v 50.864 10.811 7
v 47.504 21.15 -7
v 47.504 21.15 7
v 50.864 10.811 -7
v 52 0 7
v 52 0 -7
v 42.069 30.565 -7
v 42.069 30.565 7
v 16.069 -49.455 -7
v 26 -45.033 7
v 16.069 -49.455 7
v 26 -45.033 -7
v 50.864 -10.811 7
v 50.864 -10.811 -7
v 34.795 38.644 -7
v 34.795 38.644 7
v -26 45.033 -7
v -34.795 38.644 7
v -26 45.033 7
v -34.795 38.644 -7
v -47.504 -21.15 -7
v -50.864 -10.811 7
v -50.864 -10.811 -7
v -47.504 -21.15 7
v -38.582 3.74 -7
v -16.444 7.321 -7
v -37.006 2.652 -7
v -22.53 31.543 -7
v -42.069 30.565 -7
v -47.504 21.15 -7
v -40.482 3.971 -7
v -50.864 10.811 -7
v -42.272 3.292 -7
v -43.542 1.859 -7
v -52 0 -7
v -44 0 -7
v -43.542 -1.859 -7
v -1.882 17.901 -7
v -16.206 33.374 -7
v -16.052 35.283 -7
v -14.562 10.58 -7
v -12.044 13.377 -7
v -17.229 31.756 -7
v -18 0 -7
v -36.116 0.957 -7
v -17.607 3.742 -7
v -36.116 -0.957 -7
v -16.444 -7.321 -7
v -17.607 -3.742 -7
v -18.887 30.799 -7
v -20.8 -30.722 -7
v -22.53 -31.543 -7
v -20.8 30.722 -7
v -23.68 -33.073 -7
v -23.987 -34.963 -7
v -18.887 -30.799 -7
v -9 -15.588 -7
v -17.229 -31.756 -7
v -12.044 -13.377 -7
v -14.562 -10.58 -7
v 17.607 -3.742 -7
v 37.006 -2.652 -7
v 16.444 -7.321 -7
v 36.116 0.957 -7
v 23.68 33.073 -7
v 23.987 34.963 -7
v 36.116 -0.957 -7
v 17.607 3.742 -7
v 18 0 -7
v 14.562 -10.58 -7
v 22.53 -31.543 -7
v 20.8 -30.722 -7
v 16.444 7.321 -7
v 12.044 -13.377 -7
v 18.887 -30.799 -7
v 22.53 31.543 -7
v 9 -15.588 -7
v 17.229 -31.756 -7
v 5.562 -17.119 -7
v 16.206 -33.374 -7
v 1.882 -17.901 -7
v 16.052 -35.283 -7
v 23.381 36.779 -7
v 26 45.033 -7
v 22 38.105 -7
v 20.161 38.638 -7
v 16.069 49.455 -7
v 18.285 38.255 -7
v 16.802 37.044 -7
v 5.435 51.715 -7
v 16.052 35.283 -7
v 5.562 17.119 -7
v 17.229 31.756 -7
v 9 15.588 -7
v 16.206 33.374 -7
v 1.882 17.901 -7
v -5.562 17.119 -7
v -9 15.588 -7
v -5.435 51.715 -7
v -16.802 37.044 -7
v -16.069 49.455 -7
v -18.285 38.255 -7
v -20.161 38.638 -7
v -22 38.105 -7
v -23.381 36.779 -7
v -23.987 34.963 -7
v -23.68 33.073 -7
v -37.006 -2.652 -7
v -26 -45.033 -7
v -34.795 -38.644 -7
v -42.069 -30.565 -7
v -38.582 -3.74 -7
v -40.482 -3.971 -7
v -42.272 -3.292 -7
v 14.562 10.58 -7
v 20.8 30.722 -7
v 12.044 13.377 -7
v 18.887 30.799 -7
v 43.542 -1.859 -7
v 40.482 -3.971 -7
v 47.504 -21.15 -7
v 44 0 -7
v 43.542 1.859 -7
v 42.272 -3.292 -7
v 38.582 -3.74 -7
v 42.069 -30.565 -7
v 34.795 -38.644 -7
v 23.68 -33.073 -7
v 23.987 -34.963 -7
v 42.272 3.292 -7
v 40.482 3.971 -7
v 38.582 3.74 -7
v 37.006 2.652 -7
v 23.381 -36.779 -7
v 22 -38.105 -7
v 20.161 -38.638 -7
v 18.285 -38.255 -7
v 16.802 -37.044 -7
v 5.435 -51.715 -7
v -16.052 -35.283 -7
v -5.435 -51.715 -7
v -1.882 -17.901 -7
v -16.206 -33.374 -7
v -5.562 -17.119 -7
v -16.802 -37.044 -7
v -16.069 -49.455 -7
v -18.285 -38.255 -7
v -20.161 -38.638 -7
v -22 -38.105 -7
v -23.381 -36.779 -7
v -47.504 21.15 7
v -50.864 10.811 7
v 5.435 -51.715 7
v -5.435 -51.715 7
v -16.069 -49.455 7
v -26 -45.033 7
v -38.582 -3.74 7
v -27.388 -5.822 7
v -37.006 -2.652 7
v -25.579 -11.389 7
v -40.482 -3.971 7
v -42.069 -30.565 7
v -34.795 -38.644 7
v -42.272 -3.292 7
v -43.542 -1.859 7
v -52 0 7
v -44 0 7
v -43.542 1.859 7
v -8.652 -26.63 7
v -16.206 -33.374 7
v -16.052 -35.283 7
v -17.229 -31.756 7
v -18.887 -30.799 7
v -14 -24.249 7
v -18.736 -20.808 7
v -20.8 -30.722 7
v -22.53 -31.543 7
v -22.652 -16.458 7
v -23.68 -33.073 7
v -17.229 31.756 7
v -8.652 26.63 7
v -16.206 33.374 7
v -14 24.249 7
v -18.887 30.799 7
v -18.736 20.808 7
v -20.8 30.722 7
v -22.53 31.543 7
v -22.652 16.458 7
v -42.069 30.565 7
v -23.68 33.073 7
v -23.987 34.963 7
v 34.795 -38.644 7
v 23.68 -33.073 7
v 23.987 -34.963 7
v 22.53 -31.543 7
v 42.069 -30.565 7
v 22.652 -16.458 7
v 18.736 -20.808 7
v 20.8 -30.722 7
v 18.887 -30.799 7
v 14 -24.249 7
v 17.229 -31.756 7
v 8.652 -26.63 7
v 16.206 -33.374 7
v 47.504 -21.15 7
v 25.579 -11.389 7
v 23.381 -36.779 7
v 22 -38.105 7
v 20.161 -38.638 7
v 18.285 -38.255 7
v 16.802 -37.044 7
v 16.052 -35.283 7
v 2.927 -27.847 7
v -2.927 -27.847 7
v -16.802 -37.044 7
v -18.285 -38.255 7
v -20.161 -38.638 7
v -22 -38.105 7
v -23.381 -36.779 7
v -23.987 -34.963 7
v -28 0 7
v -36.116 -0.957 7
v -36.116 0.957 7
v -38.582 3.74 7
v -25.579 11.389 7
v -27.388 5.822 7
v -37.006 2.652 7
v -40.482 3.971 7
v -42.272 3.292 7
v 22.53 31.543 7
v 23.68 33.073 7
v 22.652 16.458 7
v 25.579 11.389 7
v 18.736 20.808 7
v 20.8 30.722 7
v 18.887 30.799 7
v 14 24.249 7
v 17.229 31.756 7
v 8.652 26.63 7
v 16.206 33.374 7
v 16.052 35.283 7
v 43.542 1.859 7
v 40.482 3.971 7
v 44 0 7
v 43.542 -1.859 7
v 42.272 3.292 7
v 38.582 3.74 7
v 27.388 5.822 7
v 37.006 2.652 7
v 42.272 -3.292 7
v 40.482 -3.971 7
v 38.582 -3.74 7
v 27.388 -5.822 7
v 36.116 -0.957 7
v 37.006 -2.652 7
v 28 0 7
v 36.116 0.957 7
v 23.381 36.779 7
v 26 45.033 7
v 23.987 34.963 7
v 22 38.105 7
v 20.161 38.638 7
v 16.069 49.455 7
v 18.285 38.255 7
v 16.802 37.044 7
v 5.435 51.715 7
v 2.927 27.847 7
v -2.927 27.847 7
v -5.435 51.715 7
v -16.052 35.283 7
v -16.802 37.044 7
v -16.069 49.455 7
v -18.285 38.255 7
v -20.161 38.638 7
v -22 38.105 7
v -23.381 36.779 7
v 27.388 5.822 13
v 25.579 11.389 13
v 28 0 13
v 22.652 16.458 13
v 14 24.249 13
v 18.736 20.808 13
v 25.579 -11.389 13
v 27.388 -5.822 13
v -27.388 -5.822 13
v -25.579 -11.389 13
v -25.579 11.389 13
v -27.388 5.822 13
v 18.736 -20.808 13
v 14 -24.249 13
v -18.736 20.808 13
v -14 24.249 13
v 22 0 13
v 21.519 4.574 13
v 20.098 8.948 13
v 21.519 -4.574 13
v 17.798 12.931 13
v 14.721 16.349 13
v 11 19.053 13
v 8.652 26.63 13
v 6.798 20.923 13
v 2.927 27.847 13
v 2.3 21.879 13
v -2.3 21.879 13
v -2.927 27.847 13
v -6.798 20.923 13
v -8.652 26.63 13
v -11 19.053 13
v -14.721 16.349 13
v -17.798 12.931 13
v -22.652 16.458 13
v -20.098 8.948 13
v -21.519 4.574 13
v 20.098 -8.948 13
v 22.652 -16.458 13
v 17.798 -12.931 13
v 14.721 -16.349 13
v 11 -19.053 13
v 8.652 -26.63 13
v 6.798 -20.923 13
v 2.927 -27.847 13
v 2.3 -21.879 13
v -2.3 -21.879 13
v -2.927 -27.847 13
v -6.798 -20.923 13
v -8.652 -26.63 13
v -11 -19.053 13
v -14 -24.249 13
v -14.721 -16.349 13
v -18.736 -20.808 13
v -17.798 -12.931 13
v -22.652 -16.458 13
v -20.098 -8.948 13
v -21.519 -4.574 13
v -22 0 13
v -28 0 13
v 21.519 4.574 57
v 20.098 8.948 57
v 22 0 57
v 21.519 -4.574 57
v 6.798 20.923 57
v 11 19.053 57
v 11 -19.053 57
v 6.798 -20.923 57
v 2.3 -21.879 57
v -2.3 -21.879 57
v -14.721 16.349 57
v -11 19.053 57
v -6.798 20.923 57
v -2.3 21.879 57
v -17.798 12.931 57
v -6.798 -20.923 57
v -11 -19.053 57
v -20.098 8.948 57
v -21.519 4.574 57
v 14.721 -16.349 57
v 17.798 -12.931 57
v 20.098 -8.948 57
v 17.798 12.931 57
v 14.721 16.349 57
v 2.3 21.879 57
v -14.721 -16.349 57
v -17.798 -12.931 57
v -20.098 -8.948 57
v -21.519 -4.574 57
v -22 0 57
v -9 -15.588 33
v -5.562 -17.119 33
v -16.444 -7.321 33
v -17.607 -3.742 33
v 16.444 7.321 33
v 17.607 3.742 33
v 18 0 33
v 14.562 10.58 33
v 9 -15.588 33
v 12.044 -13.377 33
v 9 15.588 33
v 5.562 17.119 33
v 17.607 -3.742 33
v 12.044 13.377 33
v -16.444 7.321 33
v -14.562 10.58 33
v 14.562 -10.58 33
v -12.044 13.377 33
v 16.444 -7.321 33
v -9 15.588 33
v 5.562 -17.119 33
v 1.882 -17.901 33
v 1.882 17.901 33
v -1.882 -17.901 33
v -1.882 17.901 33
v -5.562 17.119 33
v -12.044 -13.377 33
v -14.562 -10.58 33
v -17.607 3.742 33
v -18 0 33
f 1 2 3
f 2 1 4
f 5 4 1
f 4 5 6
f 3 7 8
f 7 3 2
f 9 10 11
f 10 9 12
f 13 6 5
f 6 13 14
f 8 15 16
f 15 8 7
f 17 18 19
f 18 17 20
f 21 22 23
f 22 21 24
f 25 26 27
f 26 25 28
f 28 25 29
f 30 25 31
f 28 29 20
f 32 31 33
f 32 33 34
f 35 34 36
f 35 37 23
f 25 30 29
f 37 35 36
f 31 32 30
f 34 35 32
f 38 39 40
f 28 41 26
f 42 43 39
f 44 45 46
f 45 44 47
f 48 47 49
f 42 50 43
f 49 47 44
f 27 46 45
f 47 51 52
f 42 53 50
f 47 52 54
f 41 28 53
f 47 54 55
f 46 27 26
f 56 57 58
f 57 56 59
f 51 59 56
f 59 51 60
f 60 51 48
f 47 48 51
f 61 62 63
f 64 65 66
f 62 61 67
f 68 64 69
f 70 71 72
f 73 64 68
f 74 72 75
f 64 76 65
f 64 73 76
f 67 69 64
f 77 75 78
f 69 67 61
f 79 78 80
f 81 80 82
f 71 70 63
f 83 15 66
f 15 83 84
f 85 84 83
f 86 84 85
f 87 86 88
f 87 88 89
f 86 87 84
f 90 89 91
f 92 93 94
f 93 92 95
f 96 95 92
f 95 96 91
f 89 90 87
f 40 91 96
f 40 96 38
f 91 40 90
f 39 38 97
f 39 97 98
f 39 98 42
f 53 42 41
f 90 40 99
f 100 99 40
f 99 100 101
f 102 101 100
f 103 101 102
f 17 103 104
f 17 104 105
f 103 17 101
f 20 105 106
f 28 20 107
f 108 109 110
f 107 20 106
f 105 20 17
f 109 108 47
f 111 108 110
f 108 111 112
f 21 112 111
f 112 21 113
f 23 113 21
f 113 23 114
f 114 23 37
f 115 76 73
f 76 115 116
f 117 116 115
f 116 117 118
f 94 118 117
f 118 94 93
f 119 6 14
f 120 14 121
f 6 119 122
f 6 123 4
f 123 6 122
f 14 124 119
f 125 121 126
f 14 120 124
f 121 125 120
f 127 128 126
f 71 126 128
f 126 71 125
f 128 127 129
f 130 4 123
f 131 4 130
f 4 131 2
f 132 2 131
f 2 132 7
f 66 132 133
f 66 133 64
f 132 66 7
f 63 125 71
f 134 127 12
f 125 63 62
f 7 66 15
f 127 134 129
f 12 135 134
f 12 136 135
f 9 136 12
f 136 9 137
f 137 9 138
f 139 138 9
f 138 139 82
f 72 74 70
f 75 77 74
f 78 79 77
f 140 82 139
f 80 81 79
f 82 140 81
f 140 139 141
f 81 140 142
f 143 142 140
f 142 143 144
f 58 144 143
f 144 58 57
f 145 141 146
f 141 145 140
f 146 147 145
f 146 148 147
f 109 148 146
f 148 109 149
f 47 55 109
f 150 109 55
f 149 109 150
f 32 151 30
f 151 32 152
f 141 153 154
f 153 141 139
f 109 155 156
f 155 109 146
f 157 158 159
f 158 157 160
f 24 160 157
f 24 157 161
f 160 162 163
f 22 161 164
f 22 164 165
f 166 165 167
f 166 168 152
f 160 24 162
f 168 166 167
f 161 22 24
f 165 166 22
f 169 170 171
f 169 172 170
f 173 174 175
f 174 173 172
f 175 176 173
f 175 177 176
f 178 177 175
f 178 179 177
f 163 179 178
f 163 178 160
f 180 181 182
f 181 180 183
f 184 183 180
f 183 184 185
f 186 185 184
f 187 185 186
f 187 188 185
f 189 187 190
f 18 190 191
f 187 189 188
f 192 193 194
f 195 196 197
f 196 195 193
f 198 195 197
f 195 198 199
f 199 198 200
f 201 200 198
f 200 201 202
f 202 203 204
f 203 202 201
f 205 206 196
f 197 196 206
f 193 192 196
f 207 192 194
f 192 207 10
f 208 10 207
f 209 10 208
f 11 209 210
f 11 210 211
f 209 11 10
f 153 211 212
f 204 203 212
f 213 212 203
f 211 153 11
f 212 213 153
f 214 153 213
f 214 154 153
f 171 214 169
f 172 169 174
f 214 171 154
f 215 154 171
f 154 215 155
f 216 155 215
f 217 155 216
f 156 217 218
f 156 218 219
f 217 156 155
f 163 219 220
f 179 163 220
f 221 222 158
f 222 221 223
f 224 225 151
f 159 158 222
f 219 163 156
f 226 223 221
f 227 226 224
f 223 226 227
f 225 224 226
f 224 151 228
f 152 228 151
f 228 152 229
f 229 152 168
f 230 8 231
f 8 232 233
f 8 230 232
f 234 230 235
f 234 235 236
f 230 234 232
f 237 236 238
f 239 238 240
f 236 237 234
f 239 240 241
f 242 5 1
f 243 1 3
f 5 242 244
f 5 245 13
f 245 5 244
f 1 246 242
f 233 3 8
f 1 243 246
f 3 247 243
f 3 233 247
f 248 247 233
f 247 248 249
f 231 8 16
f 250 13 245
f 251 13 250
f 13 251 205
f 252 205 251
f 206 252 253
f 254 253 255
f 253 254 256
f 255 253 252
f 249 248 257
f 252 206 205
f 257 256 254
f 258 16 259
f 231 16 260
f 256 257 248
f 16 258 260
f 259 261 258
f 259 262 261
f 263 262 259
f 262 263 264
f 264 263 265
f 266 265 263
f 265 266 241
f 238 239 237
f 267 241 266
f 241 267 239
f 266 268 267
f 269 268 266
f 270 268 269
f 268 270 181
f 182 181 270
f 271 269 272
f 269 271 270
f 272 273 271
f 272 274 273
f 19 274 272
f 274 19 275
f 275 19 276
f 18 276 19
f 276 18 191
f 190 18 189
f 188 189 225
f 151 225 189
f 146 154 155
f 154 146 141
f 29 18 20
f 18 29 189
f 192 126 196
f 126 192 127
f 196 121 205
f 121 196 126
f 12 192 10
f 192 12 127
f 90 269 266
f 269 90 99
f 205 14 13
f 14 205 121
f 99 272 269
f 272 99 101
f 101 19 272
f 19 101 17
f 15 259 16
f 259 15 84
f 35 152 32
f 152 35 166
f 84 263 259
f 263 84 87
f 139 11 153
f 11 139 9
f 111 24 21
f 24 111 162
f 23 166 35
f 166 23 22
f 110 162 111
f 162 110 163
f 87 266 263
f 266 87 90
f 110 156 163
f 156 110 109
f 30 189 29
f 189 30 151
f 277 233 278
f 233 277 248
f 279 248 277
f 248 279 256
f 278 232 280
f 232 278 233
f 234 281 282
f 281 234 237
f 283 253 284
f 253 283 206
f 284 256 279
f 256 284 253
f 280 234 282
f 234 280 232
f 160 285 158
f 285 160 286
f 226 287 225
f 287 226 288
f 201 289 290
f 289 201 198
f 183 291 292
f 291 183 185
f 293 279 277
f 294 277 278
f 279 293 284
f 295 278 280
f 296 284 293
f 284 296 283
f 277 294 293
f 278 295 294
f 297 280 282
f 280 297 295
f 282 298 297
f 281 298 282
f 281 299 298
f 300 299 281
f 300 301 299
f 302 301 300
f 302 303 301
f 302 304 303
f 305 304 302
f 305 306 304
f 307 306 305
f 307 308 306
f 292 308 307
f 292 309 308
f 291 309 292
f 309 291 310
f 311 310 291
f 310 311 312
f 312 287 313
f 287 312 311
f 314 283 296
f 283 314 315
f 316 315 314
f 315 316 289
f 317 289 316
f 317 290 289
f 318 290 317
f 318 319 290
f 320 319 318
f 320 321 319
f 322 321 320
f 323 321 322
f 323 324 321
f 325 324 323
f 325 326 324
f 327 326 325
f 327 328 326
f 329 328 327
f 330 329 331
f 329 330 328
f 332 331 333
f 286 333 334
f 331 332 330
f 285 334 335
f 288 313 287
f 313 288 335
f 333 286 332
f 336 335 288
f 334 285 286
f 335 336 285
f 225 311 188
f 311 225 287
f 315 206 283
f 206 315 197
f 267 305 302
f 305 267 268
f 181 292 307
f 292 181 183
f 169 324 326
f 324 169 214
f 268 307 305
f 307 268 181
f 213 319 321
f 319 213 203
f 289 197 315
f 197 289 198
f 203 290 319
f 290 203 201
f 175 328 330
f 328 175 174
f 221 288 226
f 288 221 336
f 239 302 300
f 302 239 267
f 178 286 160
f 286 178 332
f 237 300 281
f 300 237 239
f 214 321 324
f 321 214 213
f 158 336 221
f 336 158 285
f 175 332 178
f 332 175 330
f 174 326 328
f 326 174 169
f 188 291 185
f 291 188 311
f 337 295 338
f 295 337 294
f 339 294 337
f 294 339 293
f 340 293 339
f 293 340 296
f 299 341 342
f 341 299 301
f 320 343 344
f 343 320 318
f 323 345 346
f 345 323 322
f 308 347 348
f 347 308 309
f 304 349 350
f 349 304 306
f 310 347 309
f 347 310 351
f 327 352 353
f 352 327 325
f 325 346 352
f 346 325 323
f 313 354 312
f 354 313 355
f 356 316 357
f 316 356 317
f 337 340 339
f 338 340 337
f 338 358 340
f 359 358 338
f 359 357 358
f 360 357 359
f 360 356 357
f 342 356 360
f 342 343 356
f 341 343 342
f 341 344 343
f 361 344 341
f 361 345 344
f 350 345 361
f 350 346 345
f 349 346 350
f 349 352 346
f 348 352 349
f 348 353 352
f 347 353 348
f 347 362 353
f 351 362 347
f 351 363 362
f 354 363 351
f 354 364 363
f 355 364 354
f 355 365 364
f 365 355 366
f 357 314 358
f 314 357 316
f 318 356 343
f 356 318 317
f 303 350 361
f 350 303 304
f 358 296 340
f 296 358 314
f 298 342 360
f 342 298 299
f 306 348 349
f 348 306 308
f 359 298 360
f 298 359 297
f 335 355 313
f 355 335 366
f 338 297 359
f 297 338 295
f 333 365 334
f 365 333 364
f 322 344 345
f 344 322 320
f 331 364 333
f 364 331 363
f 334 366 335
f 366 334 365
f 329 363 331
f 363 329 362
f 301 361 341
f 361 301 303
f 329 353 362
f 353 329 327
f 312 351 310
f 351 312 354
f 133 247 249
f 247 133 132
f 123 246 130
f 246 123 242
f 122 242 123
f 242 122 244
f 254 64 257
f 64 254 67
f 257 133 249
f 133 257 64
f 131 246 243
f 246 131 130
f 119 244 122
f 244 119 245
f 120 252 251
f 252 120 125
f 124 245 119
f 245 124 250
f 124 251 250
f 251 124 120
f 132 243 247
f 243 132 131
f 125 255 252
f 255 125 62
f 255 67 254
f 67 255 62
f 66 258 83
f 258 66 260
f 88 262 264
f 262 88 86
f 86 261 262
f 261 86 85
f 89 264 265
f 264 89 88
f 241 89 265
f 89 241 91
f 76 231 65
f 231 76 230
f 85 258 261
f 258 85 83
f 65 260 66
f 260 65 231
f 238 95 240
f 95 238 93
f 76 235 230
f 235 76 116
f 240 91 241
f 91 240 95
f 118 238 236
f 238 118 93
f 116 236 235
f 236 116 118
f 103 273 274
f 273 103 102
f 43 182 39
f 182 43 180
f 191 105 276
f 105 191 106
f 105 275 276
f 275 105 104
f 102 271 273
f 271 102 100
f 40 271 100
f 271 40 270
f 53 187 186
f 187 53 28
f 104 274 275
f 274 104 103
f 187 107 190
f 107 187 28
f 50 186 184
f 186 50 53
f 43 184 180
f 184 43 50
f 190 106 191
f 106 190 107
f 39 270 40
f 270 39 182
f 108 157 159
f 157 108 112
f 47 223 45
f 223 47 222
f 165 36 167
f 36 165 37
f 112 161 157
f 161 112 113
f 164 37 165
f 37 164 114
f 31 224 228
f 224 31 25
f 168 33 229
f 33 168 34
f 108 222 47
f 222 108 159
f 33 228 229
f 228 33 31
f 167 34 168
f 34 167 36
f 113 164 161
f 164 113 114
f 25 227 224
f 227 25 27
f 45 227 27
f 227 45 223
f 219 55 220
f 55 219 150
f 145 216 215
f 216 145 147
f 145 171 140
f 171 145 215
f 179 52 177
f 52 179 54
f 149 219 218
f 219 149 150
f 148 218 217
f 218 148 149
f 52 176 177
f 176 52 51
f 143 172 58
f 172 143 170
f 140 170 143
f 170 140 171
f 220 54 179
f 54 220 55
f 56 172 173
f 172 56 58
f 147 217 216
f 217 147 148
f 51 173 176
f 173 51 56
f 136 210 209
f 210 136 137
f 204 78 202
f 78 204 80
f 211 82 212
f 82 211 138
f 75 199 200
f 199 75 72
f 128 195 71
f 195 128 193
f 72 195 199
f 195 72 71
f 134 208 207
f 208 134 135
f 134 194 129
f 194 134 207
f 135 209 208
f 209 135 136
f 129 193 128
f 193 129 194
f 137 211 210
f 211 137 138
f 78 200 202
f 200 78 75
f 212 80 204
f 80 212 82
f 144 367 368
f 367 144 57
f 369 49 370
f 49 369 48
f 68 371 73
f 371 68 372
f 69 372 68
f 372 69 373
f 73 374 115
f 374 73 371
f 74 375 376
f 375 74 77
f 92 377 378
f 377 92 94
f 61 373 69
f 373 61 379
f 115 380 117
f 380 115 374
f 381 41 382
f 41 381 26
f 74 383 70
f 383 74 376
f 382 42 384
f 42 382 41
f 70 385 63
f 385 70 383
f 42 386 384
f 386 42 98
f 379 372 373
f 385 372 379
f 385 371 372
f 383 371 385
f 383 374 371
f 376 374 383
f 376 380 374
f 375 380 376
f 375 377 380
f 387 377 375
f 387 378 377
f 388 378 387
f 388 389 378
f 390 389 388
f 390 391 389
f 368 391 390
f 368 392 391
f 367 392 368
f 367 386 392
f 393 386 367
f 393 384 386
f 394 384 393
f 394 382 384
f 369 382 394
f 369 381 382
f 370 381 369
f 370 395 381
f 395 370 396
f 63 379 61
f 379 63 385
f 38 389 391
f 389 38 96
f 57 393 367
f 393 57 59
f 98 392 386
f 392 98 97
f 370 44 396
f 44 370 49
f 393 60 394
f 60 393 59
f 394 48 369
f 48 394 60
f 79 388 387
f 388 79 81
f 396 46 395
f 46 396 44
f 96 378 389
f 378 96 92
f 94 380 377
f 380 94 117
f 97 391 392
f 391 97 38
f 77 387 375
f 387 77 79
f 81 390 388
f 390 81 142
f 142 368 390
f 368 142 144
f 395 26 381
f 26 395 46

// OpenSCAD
// 3DScad sample: bolted pipe flange
// Uses only the currently round-trippable subset.

module scene_model() {
    flange_r = 52;
    flange_h = 14;
    pipe_r = 22;
    pipe_h = 44;
    bore_r = 18;
    bolt_r = 4;
    bolt_count = 6;
    bolt_circle_r = 40;
    boss_r = 28;
    boss_h = 6;

    difference() {
        union() {
            cylinder(h=flange_h, r=flange_r, center=true);
            translate([0, 0, flange_h / 2 + boss_h / 2]) {
                cylinder(h=boss_h, r=boss_r, center=true);
            }
            translate([0, 0, flange_h / 2 + boss_h + pipe_h / 2]) {
                cylinder(h=pipe_h, r=pipe_r, center=true);
            }
        }
        cylinder(h=flange_h + boss_h + pipe_h + 2, r=bore_r, center=true);
        for (i = [0 : 1 : bolt_count - 1]) {
            rotate([0, 0, i * 360 / bolt_count]) {
                translate([bolt_circle_r, 0, 0]) {
                    cylinder(h=flange_h + 2, r=bolt_r, center=true);
                }
            }
        }
    }
}

scene_model();
